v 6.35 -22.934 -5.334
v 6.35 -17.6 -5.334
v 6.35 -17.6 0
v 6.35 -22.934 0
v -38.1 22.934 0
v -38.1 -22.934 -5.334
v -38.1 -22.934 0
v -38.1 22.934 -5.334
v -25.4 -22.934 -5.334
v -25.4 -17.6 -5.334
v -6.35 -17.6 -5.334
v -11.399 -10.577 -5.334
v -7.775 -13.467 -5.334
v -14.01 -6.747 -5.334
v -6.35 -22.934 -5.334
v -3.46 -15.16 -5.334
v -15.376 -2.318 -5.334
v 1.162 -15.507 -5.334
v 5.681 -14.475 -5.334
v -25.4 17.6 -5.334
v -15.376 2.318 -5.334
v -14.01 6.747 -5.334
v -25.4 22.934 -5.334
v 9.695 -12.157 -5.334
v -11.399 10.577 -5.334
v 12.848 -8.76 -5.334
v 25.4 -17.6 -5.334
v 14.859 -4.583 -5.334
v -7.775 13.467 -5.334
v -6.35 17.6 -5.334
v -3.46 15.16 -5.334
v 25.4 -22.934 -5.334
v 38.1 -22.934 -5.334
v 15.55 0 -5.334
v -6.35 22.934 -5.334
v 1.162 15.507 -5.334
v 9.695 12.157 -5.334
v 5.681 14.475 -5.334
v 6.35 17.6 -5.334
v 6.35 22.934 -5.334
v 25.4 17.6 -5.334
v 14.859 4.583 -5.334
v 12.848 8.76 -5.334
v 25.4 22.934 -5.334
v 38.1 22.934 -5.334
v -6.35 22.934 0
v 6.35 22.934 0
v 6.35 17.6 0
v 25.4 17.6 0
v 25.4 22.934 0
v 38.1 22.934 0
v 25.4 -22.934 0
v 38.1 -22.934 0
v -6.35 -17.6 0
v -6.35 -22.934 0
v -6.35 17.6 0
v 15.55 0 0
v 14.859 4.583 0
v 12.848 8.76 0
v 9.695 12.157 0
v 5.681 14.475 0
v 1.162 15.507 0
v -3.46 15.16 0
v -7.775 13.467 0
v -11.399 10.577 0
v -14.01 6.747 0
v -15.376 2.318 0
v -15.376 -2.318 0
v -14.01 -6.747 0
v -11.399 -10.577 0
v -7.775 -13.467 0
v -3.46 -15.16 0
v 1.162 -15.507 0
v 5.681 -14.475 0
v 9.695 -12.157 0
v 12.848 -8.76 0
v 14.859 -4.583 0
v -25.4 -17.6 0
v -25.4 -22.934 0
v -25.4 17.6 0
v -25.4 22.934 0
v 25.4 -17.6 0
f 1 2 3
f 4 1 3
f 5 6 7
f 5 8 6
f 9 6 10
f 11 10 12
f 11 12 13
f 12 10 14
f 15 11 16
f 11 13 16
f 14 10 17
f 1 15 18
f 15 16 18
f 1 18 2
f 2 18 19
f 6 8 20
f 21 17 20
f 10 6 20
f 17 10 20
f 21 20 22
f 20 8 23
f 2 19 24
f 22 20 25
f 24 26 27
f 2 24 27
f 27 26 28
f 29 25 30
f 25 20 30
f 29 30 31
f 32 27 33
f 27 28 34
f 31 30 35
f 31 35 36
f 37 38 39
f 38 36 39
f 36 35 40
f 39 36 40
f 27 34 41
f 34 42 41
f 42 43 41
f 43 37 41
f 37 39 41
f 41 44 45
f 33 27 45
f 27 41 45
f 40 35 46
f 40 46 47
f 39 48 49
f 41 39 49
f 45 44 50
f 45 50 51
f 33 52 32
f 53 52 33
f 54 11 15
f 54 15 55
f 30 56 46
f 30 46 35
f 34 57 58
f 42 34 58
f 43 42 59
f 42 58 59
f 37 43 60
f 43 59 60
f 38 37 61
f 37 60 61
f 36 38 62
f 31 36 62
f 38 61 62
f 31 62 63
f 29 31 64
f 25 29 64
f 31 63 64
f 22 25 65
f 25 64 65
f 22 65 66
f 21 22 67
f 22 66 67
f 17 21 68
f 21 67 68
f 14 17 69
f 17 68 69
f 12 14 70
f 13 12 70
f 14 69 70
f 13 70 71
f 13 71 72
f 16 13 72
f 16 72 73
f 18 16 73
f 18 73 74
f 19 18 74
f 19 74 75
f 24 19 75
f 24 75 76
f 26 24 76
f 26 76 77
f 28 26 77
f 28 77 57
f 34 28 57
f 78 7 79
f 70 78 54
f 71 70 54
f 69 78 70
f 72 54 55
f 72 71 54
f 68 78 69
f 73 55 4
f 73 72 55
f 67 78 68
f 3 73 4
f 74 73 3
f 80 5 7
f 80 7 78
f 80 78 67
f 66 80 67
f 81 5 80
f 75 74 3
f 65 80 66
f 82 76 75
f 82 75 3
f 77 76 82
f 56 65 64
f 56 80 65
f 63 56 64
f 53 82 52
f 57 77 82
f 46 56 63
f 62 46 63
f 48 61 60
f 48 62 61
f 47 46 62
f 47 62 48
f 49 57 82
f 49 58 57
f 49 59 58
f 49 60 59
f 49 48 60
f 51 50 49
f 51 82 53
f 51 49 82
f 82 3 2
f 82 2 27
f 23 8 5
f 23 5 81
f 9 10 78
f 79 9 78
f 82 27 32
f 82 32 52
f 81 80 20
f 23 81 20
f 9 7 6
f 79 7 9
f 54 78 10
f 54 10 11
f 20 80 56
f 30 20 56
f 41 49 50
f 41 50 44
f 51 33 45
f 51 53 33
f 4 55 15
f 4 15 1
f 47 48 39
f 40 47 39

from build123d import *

# Parameters (mm, degrees)
SKETCH1_W           = 76.2
SKETCH1_H           = 35.2
BOSS_EXTRUDE1_DEPTH = 5.334
SKETCH2_R           = 15.55
CUT_EXTRUDE1_DEPTH  = 43.306282701
SKETCH3_W           = 12.7
SKETCH3_H           = 5.334
BOSS_EXTRUDE2_DEPTH = 5.334
SKETCH4_W           = 12.7
SKETCH4_H           = 5.334
BOSS_EXTRUDE3_DEPTH = 5.334


with BuildPart() as part:
    # Sketch1 → Boss-Extrude1 (new body)
    with BuildSketch(Plane.XY):
        Rectangle(SKETCH1_W, SKETCH1_H)
    extrude(amount=-BOSS_EXTRUDE1_DEPTH)

    # Sketch2 → Cut-Extrude1 (cut, through all)
    with BuildSketch(Plane.XY):
        Circle(SKETCH2_R)
    extrude(amount=-CUT_EXTRUDE1_DEPTH, mode=Mode.SUBTRACT)

    # Sketch3 → Boss-Extrude2 (add)
    with BuildSketch(Plane(origin=(0, 17.6, 0), x_dir=(1, 0, 0), z_dir=(0, 1, 0))):
        with Locations((-31.75, 2.667)):
            Rectangle(SKETCH3_W, SKETCH3_H)
        with Locations((0, 2.667)):
            Rectangle(SKETCH3_W, SKETCH3_H)
        with Locations((31.75, 2.667)):
            Rectangle(SKETCH3_W, SKETCH3_H)
    extrude(amount=BOSS_EXTRUDE2_DEPTH)

    # Sketch4 → Boss-Extrude3 (add)
    with BuildSketch(Plane.XZ.offset(17.6)):
        with Locations((-31.75, -2.667)):
            Rectangle(SKETCH4_W, SKETCH4_H)
        with Locations((0, -2.667)):
            Rectangle(SKETCH4_W, SKETCH4_H)
        with Locations((31.75, -2.667)):
            Rectangle(SKETCH4_W, SKETCH4_H)
    extrude(amount=BOSS_EXTRUDE3_DEPTH)


solid = part.part
